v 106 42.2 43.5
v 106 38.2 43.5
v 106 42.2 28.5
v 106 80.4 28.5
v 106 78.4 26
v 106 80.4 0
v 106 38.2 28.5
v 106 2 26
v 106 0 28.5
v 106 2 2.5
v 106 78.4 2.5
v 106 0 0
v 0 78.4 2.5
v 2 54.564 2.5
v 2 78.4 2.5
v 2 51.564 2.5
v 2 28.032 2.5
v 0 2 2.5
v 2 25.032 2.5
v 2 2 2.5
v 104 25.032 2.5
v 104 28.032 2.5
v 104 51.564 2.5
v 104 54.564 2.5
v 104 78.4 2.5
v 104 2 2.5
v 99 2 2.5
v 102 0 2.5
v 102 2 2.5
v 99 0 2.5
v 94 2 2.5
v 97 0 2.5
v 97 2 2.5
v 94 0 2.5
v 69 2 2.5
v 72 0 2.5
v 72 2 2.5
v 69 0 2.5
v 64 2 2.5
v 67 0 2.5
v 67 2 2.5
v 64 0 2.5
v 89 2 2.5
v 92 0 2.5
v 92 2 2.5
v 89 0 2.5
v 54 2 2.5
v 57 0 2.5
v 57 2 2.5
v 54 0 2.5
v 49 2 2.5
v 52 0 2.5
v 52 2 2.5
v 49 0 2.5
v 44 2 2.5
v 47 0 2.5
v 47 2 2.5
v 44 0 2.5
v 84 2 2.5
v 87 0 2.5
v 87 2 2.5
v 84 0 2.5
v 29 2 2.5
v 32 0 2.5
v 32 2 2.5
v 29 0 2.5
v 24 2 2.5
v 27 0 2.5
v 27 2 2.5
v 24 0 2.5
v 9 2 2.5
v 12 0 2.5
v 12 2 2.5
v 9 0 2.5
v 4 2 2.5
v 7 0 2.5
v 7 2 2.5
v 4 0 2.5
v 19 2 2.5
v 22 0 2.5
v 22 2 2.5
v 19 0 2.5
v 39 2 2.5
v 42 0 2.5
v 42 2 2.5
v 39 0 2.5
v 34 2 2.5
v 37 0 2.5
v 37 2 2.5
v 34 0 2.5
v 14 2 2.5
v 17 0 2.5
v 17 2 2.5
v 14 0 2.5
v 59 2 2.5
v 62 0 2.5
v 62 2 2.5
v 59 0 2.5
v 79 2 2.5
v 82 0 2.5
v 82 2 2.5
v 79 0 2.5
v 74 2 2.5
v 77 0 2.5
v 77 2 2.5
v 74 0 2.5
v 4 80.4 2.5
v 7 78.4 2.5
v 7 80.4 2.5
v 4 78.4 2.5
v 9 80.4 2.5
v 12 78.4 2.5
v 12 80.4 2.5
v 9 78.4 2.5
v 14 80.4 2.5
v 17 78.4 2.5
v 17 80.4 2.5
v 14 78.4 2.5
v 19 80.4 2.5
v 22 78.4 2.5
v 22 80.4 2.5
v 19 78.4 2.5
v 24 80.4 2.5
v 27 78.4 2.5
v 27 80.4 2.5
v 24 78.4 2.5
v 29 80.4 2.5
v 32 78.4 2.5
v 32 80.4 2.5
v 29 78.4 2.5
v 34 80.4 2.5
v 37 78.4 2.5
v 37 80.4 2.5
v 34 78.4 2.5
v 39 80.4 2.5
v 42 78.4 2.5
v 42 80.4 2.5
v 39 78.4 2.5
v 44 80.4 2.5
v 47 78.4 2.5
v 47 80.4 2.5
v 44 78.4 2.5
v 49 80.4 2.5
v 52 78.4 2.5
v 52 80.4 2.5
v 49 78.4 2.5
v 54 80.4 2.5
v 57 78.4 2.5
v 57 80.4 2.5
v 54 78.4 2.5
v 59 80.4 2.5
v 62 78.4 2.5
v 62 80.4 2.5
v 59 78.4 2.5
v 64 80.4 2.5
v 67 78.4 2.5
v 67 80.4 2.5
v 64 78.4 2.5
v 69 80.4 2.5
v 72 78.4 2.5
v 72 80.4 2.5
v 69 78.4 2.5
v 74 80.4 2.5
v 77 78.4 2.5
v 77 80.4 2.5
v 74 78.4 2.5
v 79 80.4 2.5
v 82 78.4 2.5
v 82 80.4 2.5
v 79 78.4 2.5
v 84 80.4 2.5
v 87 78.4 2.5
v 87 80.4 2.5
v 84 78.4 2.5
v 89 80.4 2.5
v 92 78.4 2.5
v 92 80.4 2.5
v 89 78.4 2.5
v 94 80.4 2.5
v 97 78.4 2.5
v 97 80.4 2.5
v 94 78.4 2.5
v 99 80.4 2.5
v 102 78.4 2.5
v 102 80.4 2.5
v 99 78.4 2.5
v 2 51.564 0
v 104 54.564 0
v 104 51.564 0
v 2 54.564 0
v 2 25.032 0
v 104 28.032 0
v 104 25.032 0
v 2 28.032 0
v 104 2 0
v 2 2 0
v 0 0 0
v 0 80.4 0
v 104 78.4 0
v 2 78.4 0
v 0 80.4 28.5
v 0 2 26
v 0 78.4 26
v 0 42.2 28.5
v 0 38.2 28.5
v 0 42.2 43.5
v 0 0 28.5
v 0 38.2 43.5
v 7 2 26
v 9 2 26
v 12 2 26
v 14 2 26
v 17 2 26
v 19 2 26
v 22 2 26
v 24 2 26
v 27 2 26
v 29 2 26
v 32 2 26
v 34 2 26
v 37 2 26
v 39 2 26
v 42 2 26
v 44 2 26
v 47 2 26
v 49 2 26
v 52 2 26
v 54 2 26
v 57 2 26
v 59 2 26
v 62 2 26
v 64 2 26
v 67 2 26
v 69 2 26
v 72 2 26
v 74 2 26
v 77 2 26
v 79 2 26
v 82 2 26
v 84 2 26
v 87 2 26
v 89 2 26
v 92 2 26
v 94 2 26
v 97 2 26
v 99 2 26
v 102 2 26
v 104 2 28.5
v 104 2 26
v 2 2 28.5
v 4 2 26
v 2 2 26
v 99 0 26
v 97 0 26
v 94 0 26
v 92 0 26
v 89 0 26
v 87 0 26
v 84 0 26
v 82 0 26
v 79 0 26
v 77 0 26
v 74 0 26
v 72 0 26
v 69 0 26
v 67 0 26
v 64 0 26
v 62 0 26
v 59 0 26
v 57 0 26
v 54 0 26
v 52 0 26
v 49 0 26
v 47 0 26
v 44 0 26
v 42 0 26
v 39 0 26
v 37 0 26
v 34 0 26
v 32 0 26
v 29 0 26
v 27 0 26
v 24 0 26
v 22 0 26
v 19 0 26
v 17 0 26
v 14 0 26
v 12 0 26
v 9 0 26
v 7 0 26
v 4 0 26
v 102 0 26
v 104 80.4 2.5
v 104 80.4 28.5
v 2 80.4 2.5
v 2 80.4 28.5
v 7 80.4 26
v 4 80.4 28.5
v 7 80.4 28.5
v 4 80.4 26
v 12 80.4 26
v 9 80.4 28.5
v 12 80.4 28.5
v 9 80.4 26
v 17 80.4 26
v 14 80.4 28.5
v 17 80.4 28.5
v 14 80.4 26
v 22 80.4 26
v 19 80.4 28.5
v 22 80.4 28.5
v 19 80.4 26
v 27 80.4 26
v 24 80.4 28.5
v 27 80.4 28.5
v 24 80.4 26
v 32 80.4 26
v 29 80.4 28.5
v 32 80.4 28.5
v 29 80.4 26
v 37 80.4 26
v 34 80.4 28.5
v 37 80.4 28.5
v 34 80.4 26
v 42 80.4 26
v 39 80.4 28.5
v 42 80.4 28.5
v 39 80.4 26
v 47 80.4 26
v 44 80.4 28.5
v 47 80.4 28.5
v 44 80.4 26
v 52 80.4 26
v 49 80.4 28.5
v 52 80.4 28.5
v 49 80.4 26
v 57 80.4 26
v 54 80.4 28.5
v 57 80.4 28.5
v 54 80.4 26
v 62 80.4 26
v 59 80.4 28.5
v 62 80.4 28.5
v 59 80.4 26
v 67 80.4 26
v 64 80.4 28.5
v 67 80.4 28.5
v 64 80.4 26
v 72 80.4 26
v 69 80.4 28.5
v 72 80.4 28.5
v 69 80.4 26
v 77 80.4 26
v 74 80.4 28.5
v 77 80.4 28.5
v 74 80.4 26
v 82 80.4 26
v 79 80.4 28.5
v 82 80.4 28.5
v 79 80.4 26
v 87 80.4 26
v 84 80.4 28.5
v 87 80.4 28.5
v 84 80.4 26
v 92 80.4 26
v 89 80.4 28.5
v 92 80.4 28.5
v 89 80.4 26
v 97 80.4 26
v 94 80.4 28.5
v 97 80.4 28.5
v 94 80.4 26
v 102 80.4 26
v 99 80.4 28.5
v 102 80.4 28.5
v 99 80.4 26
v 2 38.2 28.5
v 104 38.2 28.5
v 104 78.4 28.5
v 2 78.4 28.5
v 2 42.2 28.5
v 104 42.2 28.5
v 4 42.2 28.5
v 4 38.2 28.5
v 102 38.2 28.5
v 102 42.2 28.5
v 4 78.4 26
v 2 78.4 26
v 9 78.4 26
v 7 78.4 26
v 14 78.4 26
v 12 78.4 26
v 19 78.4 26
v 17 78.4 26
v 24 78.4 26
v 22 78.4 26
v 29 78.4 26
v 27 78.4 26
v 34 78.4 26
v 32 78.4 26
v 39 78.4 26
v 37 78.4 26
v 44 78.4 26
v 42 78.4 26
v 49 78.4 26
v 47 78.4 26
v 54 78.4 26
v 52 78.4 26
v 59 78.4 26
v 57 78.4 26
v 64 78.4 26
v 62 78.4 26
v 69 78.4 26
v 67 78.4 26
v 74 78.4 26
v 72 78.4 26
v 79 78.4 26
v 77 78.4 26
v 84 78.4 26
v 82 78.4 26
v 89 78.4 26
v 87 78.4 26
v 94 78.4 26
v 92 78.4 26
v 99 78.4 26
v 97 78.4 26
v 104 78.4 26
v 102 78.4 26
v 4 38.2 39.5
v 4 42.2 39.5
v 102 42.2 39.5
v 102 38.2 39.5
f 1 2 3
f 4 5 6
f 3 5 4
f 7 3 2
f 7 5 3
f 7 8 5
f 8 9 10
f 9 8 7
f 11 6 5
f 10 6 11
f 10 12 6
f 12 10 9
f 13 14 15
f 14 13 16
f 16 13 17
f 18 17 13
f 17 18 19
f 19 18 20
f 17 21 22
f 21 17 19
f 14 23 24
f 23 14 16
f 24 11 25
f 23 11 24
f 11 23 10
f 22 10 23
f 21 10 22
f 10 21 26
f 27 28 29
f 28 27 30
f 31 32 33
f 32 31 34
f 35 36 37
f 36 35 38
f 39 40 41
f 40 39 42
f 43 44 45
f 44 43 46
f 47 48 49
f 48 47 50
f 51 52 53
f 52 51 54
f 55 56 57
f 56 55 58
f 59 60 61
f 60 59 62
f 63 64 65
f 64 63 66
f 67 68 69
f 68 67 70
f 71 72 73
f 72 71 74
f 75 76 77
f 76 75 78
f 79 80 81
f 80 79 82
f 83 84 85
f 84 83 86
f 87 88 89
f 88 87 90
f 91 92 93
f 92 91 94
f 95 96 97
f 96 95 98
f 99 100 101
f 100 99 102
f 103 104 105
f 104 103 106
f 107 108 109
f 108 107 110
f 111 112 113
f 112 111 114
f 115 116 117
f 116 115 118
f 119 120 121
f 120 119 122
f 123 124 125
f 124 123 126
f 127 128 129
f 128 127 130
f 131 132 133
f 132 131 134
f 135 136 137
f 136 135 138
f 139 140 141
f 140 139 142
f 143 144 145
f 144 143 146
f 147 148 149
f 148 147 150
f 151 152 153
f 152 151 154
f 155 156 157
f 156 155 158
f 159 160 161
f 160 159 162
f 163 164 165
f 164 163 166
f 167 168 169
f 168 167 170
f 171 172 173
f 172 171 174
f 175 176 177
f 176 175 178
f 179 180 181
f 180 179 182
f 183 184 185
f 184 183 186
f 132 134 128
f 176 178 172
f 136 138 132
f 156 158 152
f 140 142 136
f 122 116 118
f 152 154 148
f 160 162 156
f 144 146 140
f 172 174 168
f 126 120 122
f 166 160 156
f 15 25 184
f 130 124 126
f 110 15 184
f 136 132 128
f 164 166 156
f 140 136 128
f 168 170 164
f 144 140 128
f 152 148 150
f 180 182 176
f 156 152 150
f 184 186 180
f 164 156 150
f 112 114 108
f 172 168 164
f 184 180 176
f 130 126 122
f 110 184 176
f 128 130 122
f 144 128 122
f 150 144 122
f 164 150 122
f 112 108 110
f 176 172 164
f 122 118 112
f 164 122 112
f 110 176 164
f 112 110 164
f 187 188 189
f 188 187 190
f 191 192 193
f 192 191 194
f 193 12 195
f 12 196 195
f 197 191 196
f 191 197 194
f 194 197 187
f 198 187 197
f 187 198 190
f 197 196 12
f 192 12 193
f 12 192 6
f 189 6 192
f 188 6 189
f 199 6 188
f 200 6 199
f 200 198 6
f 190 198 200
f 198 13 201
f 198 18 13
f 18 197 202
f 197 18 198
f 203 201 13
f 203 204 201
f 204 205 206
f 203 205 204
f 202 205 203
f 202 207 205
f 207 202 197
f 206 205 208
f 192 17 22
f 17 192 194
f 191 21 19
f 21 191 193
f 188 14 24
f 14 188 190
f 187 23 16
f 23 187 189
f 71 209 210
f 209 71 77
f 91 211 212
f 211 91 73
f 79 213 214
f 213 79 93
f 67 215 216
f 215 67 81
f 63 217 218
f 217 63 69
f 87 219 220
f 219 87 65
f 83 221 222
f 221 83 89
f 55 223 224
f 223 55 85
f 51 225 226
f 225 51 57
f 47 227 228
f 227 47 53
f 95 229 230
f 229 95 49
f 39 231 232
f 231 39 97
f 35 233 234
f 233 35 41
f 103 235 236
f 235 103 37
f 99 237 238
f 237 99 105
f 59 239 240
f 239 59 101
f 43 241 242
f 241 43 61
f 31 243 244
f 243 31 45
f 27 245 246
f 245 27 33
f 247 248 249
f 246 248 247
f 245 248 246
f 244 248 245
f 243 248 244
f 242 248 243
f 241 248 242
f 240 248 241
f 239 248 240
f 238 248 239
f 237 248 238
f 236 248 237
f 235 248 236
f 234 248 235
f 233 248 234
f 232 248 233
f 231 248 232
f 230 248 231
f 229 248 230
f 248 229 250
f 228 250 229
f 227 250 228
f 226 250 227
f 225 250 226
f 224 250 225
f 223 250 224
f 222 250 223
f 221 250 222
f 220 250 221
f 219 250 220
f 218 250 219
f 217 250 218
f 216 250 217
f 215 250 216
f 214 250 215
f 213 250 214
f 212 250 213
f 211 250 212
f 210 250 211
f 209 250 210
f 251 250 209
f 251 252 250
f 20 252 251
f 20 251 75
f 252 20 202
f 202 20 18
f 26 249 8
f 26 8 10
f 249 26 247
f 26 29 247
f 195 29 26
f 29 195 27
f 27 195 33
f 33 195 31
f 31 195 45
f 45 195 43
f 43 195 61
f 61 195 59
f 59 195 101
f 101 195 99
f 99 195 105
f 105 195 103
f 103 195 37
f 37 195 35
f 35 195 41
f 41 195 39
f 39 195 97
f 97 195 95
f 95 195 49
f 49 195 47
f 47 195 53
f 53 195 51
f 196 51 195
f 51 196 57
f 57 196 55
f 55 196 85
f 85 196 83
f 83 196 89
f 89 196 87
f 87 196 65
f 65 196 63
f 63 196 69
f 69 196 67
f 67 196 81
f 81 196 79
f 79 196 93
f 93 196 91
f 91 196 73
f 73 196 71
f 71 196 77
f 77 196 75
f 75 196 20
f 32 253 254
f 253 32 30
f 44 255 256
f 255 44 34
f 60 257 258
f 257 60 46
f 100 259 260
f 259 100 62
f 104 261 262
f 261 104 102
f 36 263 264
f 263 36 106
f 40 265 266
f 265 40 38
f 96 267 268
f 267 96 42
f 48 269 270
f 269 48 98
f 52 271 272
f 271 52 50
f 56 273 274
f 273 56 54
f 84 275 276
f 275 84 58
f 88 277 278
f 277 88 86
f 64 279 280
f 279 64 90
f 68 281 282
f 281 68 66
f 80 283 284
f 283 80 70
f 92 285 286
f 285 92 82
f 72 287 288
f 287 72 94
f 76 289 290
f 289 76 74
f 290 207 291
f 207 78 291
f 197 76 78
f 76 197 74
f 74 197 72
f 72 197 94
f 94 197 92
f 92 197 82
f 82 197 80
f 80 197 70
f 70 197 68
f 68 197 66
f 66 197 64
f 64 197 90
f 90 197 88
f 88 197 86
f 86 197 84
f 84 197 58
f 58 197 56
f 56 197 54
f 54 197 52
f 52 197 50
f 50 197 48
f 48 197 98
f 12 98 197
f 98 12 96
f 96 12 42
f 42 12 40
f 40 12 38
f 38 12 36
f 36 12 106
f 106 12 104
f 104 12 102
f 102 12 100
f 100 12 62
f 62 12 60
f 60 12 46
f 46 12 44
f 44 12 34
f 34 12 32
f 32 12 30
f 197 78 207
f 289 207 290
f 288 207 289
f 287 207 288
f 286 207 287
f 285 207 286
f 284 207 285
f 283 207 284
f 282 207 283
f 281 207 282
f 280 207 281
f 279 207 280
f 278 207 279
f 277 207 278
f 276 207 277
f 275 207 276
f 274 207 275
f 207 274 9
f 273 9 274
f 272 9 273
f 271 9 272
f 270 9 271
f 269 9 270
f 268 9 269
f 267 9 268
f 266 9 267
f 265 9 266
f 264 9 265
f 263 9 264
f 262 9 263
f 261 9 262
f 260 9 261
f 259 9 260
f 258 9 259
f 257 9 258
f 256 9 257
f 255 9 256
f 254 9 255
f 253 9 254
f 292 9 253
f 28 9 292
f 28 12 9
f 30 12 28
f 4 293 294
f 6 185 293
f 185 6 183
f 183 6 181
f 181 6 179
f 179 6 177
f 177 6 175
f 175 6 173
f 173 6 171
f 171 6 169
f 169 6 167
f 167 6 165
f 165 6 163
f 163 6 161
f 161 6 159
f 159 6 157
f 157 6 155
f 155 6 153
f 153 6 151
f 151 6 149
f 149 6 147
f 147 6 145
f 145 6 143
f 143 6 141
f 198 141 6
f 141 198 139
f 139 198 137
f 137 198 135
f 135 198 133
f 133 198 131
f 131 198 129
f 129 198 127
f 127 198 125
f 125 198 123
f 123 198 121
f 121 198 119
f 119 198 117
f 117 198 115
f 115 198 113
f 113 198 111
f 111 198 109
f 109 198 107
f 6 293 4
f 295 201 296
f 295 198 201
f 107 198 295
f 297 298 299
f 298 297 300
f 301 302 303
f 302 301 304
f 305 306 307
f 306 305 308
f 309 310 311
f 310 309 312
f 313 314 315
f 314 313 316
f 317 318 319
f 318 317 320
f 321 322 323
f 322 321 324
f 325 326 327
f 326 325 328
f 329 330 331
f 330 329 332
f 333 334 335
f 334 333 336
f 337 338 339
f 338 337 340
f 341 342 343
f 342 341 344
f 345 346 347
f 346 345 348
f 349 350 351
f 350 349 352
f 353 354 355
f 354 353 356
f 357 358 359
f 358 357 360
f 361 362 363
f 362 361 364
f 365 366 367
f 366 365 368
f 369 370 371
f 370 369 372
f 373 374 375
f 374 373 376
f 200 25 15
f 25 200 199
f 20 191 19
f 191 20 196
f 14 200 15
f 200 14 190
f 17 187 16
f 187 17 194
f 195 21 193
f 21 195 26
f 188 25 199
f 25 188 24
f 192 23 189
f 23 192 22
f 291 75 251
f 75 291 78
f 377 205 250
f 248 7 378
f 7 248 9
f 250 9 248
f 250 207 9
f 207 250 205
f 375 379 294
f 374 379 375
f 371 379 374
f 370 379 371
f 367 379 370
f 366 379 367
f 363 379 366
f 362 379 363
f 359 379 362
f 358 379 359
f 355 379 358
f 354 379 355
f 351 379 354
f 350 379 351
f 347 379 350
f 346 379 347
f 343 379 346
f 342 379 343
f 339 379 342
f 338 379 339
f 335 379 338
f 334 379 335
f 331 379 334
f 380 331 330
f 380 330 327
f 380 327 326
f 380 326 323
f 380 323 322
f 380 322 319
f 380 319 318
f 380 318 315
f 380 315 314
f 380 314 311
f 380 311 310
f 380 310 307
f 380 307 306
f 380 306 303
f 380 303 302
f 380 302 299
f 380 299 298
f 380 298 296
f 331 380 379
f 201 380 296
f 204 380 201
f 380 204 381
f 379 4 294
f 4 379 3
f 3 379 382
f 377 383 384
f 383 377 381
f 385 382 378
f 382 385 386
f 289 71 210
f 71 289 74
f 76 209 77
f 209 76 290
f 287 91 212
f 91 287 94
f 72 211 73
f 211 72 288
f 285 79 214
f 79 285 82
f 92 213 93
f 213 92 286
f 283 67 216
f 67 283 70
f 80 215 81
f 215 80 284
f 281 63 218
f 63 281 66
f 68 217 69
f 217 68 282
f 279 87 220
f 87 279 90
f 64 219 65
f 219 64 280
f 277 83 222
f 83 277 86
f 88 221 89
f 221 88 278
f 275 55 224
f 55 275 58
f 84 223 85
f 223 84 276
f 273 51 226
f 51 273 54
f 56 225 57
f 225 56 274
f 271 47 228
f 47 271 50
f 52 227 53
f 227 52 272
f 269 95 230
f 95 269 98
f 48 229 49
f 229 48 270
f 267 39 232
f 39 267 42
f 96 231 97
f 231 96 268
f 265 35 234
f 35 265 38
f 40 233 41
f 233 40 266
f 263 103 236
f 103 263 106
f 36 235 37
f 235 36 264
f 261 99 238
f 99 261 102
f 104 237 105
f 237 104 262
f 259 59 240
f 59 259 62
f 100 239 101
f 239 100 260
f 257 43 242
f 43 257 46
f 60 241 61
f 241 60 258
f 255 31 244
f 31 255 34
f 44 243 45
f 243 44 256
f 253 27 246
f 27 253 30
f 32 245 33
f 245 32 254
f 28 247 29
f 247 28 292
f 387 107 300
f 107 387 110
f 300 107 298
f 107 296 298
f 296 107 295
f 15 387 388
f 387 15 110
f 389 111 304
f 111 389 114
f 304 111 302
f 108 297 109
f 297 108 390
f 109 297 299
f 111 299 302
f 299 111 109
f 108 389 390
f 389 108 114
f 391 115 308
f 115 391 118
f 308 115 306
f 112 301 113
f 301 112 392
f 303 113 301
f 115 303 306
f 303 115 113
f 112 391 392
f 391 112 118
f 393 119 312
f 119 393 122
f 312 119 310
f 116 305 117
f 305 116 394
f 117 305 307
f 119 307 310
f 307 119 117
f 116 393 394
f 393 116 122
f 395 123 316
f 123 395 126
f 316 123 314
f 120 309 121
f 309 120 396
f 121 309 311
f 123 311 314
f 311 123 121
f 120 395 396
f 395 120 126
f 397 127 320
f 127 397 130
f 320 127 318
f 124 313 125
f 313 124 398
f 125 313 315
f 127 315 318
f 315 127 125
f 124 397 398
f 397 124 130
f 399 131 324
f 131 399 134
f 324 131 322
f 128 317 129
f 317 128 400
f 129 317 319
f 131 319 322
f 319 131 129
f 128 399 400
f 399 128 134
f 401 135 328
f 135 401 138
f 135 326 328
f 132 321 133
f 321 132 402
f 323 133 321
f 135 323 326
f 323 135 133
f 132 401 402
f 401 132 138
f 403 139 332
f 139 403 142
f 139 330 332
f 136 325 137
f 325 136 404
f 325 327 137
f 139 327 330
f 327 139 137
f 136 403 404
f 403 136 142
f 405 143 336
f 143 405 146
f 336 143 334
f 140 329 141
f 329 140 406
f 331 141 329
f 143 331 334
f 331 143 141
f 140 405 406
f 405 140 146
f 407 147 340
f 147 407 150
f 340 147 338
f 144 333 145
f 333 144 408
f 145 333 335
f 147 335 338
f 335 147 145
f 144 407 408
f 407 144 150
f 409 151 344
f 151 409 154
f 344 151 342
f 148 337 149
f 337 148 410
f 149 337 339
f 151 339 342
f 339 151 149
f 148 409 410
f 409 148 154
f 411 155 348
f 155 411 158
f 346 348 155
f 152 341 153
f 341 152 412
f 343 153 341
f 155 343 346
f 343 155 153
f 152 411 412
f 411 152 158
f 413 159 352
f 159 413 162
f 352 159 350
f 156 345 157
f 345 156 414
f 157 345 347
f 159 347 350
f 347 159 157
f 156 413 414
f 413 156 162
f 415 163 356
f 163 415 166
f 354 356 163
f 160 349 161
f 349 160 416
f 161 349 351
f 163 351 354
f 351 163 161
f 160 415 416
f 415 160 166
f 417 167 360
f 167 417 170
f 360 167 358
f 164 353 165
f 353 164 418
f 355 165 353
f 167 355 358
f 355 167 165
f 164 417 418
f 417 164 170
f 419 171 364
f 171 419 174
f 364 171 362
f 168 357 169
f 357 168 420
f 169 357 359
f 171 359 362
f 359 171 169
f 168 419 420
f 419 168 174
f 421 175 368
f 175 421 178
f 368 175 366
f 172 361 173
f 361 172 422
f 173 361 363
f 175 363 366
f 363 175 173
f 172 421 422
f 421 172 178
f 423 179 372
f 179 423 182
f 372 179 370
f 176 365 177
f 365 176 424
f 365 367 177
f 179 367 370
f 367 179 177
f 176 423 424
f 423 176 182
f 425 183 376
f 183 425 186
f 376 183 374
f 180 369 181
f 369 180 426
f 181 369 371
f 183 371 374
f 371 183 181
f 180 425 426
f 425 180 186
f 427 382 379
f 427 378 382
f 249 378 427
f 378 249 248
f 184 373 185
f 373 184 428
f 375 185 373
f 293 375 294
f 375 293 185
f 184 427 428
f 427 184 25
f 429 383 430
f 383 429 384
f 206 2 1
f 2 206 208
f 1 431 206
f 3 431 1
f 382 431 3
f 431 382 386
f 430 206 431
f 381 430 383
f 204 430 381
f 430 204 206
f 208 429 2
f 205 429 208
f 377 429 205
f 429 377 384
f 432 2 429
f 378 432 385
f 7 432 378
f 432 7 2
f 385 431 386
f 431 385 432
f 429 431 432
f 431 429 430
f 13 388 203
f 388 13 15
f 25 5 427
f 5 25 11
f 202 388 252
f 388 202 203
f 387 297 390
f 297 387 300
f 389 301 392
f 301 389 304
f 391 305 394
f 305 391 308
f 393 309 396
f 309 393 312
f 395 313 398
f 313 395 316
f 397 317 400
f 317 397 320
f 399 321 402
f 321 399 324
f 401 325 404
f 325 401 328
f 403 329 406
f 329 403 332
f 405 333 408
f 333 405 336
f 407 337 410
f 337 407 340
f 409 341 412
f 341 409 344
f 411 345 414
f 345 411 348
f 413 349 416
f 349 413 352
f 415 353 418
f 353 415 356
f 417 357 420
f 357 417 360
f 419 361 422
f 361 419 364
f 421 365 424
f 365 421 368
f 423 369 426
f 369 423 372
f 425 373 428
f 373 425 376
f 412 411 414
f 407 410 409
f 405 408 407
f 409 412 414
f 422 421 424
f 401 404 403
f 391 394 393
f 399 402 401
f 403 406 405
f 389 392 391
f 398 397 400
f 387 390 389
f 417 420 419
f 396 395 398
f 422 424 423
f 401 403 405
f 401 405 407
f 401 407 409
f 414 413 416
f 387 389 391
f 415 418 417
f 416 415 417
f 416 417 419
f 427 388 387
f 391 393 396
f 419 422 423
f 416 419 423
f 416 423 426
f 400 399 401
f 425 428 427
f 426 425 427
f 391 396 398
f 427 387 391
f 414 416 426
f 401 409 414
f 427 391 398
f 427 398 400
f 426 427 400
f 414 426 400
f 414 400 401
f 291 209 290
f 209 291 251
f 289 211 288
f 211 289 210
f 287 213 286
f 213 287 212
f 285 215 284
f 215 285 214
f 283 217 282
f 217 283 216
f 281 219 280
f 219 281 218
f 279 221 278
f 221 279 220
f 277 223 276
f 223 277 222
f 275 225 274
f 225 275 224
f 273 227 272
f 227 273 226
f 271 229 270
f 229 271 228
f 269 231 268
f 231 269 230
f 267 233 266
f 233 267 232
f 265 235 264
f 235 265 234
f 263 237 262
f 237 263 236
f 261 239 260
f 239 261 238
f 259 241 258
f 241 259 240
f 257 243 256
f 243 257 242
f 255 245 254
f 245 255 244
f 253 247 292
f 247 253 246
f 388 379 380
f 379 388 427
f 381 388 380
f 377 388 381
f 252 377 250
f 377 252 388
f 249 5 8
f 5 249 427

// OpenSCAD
// file: libs/microscope-slide-hyperobject/slide.scad
// ----------------------------------------------------
// Material Hyperobject Compensations
// (Passed dynamically by the Commons API)
// ----------------------------------------------------
mat_shrinkage_x = 1.0;
mat_shrinkage_y = 1.0;
mat_shrinkage_z = 1.0;

mat_clear_press = 0.0;
mat_clear_slide = 0.0;
mat_clear_loose = 0.0;

// Standard Microscope Slide Dimensions (ISO 8037)
function slide_slot_width(thickness, tolerance) = thickness + tolerance + mat_clear_slide + 0.1;
function slide_pitch(slot_w, rib_w) = slot_w + rib_w;

module slide_retention_rib(height, depth, root_w, tip_w, chamfer_h) {
  union() {
    cube([root_w, depth, height - chamfer_h]);
    translate([0, 0, height - chamfer_h])
      polyhedron(
        points=[
          [0, 0, 0],
          [root_w, 0, 0],
          [root_w, depth, 0],
          [0, depth, 0],
          [(root_w - tip_w) / 2, 0, chamfer_h],
          [(root_w + tip_w) / 2, 0, chamfer_h],
          [(root_w + tip_w) / 2, depth, chamfer_h],
          [(root_w - tip_w) / 2, depth, chamfer_h],
        ],
        faces=[
          [0, 1, 2, 3],
          [4, 5, 6, 7],
          [0, 4, 7, 3],
          [1, 5, 6, 2],
          [0, 1, 5, 4],
          [3, 2, 6, 7],
        ]
      );
  }
}

module slide_slot_array(count, pitch, height, depth, root_w, tip_w, chamfer_h, tapered) {
  for (i = [0:count]) {
    translate([i * pitch, 0, 0])
      slide_retention_rib(height, depth, root_w, tip_w, chamfer_h);
  }
}

// ----------------------------------------------------
// ISO 8037-1 Bounded 4D Geometry
// ----------------------------------------------------

module iso_8037_slide(length, width, thickness) {
  // A standard microscope slide volumetric cartridge.
  // Glass usually has polished or ground edges.
  cube([length, width, thickness], center=true);
}

// ----------------------------------------------------
// Cartridge Execution Logic (Triggered by Manifest)
// ----------------------------------------------------

slide_standard = 0; // [0:ISO 8037-1 Primary, 1:ISO 8037-1 Alternate, 2:ISO 8255 #1.5H Cover, 3:ISO 8255 #1 Cover, 4:Custom]
custom_slide_length = 76.0;
custom_slide_width = 26.0;
custom_slide_thickness = 1.0;

render_mode = 0; // [0:main]

if (render_mode == 0) {
  // Material simulation logic for transparency via OpenSCAD nightly alpha
  color([0.8, 0.9, 0.9, 0.4]) {
    // Apply Material Hyperobject Shrinkage Compensation
    scale([mat_shrinkage_x, mat_shrinkage_y, mat_shrinkage_z]) {
      if (slide_standard == 0) {
        // ISO 8037-1 Primary
        iso_8037_slide(76.0, 26.0, 1.0);
      } else if (slide_standard == 1) {
        // ISO 8037-1 Alternate
        iso_8037_slide(75.0, 25.0, 1.0);
      } else if (slide_standard == 2) {
        // ISO 8255 #1.5H Cover Glass
        iso_8037_slide(22.0, 22.0, 0.17);
      } else if (slide_standard == 3) {
        // ISO 8255 #1 Cover Glass
        iso_8037_slide(22.0, 22.0, 0.15);
      } else if (slide_standard == 4) {
        // Custom Geometry
        iso_8037_slide(custom_slide_length, custom_slide_width, custom_slide_thickness);
      }
    }
  }
}
// main file
// ============================================================================
// staining_rack.scad — Class III: Kinematic Fluid / Staining Rack
// ============================================================================
// Reference: docs/RESEARCH.pdf §6 (Kinematic Fluid Systems)
//
// Skeletonized open frame designed for slide immersion in staining solutions
// (Coplin jars, staining dishes). Features knife-edge ribs for minimal contact,
// open crossbar bottom for fluid circulation, and drainage-angled surfaces.
//
// Parts:
//   render_mode 0 → rack
// ============================================================================

use <slide_lib.scad>

// ---------------------------------------------------------------------------
// Parameters (injected by platform via -D)
// ---------------------------------------------------------------------------

// --- Slide Standard ---
slide_standard = 0; // 0=ISO, 1=US, 2=Petrographic, 3=Supa Mega, 4=Custom
custom_slide_length = 76;
custom_slide_width = 26;
custom_slide_thickness = 1.0;

// --- Architecture ---
num_slots = 20; // Number of slide positions

// --- Tolerances ---
tolerance_xy = 0.4; // XY clearance (mm)
tolerance_z = 0.2; // Z / thickness clearance (mm)

// --- Structure ---
wall_thickness = 2.0; // Outer wall / pillar thickness (mm)

// --- Rack-specific ---
handle = 1; // 1=generate carrying handle
drainage_angle = 5; // Drainage slope in degrees
open_bottom = 1; // 1=crossbar floor, 0=solid floor

// --- Features ---
label_area = 1; // 1=generate debossed label recess

// --- Quality ---
fn = 0; // Resolution ($fn), 0 = auto

// --- Mode ---
render_mode = 0; // 0=rack

// ---------------------------------------------------------------------------
// Resolution
// ---------------------------------------------------------------------------
$fn = fn > 0 ? fn : 32;

// ---------------------------------------------------------------------------
// Resolve Slide Dimensions
// ---------------------------------------------------------------------------
_slide = resolve_slide(
  slide_standard, custom_slide_length,
  custom_slide_width, custom_slide_thickness
);
_sl = _slide[0]; // slide length
_sw = _slide[1]; // slide width
_st = _slide[2]; // slide thickness

// ---------------------------------------------------------------------------
// Derived Dimensions (RESEARCH §6.1)
// ---------------------------------------------------------------------------

// Staining racks force minimum pitch for fluid dynamics (RESEARCH §5.1.2)
_min_rib_w = 2.0;
_slot_w = slot_width(_st, tolerance_z);
_pitch = pitch(_slot_w, _min_rib_w);
_forced_pitch = max(_pitch, 5.0); // Minimum 5mm pitch for staining

// Slot depth: slides fully immersed, depth = slide_width
_slot_depth = _sw;
_rib_height = _slot_depth;

// Frame dimensions
_pillar_w = wall_thickness;
_crossbar_w = 3.0; // crossbar width
_crossbar_h = 2.5; // crossbar height

// Body envelope
_body_x = (num_slots * _forced_pitch) + _min_rib_w + (2 * _pillar_w);
_body_y = _sl + (2 * _pillar_w) + tolerance_xy;
_base_h = open_bottom == 1 ? _crossbar_h : wall_thickness;
_body_z = _rib_height + _base_h;

// Handle dimensions (RESEARCH §6.2)
_handle_w = min(_body_x * 0.6, 80);
_handle_h = 15;
_handle_thick = 4;

// ---------------------------------------------------------------------------
// rack — Skeletonized staining frame
// ---------------------------------------------------------------------------
module rack() {
  // --- Four corner pillars ---
  // Front-left
  cube([_pillar_w, _pillar_w, _body_z]);
  // Front-right
  translate([_body_x - _pillar_w, 0, 0])
    cube([_pillar_w, _pillar_w, _body_z]);
  // Back-left
  translate([0, _body_y - _pillar_w, 0])
    cube([_pillar_w, _pillar_w, _body_z]);
  // Back-right
  translate([_body_x - _pillar_w, _body_y - _pillar_w, 0])
    cube([_pillar_w, _pillar_w, _body_z]);

  // --- Top rails (connect pillars at the top) ---
  // Front rail
  translate([0, 0, _body_z - _crossbar_h])
    cube([_body_x, _pillar_w, _crossbar_h]);
  // Back rail
  translate([0, _body_y - _pillar_w, _body_z - _crossbar_h])
    cube([_body_x, _pillar_w, _crossbar_h]);
  // Left rail
  translate([0, 0, _body_z - _crossbar_h])
    cube([_pillar_w, _body_y, _crossbar_h]);
  // Right rail
  translate([_body_x - _pillar_w, 0, _body_z - _crossbar_h])
    cube([_pillar_w, _body_y, _crossbar_h]);

  // --- Bottom crossbars (open or solid) ---
  if (open_bottom == 1) {
    // Front and back bottom rails
    cube([_body_x, _pillar_w, _crossbar_h]);
    translate([0, _body_y - _pillar_w, 0])
      cube([_body_x, _pillar_w, _crossbar_h]);
    // Left and right bottom rails
    cube([_pillar_w, _body_y, _crossbar_h]);
    translate([_body_x - _pillar_w, 0, 0])
      cube([_pillar_w, _body_y, _crossbar_h]);
    // Two crossbars at 33% and 66% for slide support
    for (frac = [0.33, 0.66]) {
      translate([0, _body_y * frac - _crossbar_w / 2, 0])
        cube([_body_x, _crossbar_w, _crossbar_h]);
    }
  } else {
    // Solid floor with drainage slope
    if (drainage_angle > 0) {
      drainage_slope(_body_y, _body_x, wall_thickness, drainage_angle);
    } else {
      cube([_body_x, _body_y, wall_thickness]);
    }
  }

  // --- Slotted rib rails (knife-edge profile) ---
  // Front rib rail: sits on front bottom rail, extends up to rib height
  translate([_pillar_w, 0, _crossbar_h]) {
    for (i = [0:num_slots]) {
      translate([i * _forced_pitch, 0, 0])
        rectangular_rib(_rib_height, _pillar_w, _min_rib_w);
    }
  }

  // Back rib rail (mirrors front)
  translate([_pillar_w, _body_y - _pillar_w, _crossbar_h]) {
    for (i = [0:num_slots]) {
      translate([i * _forced_pitch, 0, 0])
        rectangular_rib(_rib_height, _pillar_w, _min_rib_w);
    }
  }

  // --- Handle (RESEARCH §6.2) ---
  if (handle == 1) {
    _hy = (_body_y - _handle_thick) / 2;
    _hz = _body_z;

    // Uprights anchored to Left and Right side rails
    translate([0, _hy, _hz])
      cube([_handle_thick, _handle_thick, _handle_h]);
    translate([_body_x - _handle_thick, _hy, _hz])
      cube([_handle_thick, _handle_thick, _handle_h]);

    // Crossbar
    translate([0, _hy, _hz + _handle_h - _handle_thick])
      cube([_body_x, _handle_thick, _handle_thick]);
  }

  // --- Label recess on front pillar ---
  if (label_area == 1 && fn > 0) {
    _label_w = min(30, _body_x * 0.3);
    _label_h = min(8, _crossbar_h * 0.8);
    translate([(_body_x - _label_w) / 2, -0.01, (_crossbar_h - _label_h) / 2])
      rotate([90, 0, 0])
        translate([0, 0, -0.4])
          label_recess(_label_w, _label_h, 0.5);
  }
}

// ---------------------------------------------------------------------------
// Render Mode Dispatch
// ---------------------------------------------------------------------------
if (render_mode == 0) {
  rack();
}
